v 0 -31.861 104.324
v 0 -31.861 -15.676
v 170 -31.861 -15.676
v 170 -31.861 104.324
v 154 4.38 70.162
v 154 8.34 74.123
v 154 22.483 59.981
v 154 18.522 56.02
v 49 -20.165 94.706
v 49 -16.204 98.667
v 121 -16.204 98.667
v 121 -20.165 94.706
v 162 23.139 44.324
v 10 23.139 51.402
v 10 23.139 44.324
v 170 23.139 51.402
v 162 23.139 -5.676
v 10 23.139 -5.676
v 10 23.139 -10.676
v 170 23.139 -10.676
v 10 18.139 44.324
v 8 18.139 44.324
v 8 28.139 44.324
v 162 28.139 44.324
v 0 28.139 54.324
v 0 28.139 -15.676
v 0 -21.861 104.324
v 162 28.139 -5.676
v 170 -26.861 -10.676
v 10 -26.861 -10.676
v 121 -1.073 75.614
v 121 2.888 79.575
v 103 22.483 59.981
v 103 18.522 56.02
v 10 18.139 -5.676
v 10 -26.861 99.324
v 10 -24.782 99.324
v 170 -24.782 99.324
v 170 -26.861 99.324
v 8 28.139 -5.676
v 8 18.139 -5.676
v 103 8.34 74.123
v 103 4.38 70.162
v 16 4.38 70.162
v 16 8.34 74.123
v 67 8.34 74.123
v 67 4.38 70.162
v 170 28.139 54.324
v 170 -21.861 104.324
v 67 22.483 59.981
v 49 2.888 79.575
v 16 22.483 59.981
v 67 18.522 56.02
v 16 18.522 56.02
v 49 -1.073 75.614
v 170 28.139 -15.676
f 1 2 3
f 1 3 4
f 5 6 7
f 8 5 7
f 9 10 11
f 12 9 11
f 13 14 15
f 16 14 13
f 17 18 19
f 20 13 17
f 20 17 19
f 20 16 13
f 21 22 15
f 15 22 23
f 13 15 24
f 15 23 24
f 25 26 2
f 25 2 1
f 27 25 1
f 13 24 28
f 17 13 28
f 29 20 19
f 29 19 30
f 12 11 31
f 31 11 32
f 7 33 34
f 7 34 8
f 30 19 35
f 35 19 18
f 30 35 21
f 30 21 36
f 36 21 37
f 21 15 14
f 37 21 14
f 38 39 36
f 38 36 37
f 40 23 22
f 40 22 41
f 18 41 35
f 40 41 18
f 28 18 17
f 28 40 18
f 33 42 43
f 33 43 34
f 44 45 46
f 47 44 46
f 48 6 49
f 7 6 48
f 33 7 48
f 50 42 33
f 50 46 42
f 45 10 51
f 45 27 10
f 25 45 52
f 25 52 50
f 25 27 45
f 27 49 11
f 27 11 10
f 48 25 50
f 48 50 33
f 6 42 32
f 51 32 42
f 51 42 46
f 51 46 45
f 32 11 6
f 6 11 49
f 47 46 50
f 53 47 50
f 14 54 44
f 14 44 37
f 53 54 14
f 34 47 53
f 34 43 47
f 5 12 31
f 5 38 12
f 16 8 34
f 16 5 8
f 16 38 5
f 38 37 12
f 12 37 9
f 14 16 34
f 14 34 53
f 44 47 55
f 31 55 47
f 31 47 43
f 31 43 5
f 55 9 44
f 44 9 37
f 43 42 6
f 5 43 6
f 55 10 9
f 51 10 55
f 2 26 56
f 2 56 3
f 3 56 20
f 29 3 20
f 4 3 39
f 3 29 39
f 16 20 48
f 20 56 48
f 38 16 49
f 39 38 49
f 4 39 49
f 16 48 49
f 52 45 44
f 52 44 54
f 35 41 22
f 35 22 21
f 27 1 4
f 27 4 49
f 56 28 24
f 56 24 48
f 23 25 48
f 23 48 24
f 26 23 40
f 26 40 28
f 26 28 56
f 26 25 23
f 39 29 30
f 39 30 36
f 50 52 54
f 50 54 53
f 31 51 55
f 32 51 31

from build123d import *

# Parameters (mm, degrees)
BOSS_EXTRUDE1_DEPTH = 170
SKETCH2_W           = 154
SKETCH2_H           = 50
CUT_EXTRUDE1_DEPTH  = 10
CUT_EXTRUDE2_DEPTH  = 160
SKETCH4_W           = 51
SKETCH4_H           = 20
SKETCH4_W_2         = 72
SKETCH4_H_2         = 27
CUT_EXTRUDE3_DEPTH  = 10


with BuildPart() as part:
    # Sketch1 → Boss-Extrude1 (new body)
    with BuildSketch(Plane(origin=(0, 0, 0), x_dir=(0, 0, -1), z_dir=(1, 0, 0))):
        Polygon((-54.32397065, 28.139382559), (15.67602935, 28.139382559), (15.67602935, -31.860617441), (-104.32397065, -31.860617441), (-104.32397065, -21.860617441), align=None)
    extrude(amount=BOSS_EXTRUDE1_DEPTH)

    # Sketch2 → Cut-Extrude1 (cut)
    with BuildSketch(Plane(origin=(0, 28.139382559, 0), x_dir=(1, 0, 0), z_dir=(0, 1, 0))):
        with Locations((85, -19.32397065)):
            Rectangle(SKETCH2_W, SKETCH2_H)
    extrude(amount=-CUT_EXTRUDE1_DEPTH, mode=Mode.SUBTRACT)

    # Sketch3 → Cut-Extrude2 (cut)
    with BuildSketch(Plane(origin=(170, 0, 0), x_dir=(0, 0, -1), z_dir=(1, 0, 0))):
        Polygon((-51.40243063, 23.139382559), (10.67602935, 23.139382559), (10.67602935, -26.860617441), (-99.32397065, -26.860617441), (-99.32397065, -24.782157461), align=None)
    extrude(amount=-CUT_EXTRUDE2_DEPTH, mode=Mode.SUBTRACT)

    # Sketch4 → Cut-Extrude3 (cut)
    with BuildSketch(Plane(origin=(0, 41.231676605, 41.231676605), x_dir=(1, 0, 0), z_dir=(0, 0.7071067811865474, 0.7071067811865477))):
        with Locations((41.5, -36.515299802)):
            Rectangle(SKETCH4_W, SKETCH4_H)
        with Locations((128.5, -36.515299802)):
            Rectangle(SKETCH4_W, SKETCH4_H)
        with Locations((85, -67.72597792)):
            Rectangle(SKETCH4_W_2, SKETCH4_H_2)
    extrude(amount=-CUT_EXTRUDE3_DEPTH, mode=Mode.SUBTRACT)


solid = part.part
